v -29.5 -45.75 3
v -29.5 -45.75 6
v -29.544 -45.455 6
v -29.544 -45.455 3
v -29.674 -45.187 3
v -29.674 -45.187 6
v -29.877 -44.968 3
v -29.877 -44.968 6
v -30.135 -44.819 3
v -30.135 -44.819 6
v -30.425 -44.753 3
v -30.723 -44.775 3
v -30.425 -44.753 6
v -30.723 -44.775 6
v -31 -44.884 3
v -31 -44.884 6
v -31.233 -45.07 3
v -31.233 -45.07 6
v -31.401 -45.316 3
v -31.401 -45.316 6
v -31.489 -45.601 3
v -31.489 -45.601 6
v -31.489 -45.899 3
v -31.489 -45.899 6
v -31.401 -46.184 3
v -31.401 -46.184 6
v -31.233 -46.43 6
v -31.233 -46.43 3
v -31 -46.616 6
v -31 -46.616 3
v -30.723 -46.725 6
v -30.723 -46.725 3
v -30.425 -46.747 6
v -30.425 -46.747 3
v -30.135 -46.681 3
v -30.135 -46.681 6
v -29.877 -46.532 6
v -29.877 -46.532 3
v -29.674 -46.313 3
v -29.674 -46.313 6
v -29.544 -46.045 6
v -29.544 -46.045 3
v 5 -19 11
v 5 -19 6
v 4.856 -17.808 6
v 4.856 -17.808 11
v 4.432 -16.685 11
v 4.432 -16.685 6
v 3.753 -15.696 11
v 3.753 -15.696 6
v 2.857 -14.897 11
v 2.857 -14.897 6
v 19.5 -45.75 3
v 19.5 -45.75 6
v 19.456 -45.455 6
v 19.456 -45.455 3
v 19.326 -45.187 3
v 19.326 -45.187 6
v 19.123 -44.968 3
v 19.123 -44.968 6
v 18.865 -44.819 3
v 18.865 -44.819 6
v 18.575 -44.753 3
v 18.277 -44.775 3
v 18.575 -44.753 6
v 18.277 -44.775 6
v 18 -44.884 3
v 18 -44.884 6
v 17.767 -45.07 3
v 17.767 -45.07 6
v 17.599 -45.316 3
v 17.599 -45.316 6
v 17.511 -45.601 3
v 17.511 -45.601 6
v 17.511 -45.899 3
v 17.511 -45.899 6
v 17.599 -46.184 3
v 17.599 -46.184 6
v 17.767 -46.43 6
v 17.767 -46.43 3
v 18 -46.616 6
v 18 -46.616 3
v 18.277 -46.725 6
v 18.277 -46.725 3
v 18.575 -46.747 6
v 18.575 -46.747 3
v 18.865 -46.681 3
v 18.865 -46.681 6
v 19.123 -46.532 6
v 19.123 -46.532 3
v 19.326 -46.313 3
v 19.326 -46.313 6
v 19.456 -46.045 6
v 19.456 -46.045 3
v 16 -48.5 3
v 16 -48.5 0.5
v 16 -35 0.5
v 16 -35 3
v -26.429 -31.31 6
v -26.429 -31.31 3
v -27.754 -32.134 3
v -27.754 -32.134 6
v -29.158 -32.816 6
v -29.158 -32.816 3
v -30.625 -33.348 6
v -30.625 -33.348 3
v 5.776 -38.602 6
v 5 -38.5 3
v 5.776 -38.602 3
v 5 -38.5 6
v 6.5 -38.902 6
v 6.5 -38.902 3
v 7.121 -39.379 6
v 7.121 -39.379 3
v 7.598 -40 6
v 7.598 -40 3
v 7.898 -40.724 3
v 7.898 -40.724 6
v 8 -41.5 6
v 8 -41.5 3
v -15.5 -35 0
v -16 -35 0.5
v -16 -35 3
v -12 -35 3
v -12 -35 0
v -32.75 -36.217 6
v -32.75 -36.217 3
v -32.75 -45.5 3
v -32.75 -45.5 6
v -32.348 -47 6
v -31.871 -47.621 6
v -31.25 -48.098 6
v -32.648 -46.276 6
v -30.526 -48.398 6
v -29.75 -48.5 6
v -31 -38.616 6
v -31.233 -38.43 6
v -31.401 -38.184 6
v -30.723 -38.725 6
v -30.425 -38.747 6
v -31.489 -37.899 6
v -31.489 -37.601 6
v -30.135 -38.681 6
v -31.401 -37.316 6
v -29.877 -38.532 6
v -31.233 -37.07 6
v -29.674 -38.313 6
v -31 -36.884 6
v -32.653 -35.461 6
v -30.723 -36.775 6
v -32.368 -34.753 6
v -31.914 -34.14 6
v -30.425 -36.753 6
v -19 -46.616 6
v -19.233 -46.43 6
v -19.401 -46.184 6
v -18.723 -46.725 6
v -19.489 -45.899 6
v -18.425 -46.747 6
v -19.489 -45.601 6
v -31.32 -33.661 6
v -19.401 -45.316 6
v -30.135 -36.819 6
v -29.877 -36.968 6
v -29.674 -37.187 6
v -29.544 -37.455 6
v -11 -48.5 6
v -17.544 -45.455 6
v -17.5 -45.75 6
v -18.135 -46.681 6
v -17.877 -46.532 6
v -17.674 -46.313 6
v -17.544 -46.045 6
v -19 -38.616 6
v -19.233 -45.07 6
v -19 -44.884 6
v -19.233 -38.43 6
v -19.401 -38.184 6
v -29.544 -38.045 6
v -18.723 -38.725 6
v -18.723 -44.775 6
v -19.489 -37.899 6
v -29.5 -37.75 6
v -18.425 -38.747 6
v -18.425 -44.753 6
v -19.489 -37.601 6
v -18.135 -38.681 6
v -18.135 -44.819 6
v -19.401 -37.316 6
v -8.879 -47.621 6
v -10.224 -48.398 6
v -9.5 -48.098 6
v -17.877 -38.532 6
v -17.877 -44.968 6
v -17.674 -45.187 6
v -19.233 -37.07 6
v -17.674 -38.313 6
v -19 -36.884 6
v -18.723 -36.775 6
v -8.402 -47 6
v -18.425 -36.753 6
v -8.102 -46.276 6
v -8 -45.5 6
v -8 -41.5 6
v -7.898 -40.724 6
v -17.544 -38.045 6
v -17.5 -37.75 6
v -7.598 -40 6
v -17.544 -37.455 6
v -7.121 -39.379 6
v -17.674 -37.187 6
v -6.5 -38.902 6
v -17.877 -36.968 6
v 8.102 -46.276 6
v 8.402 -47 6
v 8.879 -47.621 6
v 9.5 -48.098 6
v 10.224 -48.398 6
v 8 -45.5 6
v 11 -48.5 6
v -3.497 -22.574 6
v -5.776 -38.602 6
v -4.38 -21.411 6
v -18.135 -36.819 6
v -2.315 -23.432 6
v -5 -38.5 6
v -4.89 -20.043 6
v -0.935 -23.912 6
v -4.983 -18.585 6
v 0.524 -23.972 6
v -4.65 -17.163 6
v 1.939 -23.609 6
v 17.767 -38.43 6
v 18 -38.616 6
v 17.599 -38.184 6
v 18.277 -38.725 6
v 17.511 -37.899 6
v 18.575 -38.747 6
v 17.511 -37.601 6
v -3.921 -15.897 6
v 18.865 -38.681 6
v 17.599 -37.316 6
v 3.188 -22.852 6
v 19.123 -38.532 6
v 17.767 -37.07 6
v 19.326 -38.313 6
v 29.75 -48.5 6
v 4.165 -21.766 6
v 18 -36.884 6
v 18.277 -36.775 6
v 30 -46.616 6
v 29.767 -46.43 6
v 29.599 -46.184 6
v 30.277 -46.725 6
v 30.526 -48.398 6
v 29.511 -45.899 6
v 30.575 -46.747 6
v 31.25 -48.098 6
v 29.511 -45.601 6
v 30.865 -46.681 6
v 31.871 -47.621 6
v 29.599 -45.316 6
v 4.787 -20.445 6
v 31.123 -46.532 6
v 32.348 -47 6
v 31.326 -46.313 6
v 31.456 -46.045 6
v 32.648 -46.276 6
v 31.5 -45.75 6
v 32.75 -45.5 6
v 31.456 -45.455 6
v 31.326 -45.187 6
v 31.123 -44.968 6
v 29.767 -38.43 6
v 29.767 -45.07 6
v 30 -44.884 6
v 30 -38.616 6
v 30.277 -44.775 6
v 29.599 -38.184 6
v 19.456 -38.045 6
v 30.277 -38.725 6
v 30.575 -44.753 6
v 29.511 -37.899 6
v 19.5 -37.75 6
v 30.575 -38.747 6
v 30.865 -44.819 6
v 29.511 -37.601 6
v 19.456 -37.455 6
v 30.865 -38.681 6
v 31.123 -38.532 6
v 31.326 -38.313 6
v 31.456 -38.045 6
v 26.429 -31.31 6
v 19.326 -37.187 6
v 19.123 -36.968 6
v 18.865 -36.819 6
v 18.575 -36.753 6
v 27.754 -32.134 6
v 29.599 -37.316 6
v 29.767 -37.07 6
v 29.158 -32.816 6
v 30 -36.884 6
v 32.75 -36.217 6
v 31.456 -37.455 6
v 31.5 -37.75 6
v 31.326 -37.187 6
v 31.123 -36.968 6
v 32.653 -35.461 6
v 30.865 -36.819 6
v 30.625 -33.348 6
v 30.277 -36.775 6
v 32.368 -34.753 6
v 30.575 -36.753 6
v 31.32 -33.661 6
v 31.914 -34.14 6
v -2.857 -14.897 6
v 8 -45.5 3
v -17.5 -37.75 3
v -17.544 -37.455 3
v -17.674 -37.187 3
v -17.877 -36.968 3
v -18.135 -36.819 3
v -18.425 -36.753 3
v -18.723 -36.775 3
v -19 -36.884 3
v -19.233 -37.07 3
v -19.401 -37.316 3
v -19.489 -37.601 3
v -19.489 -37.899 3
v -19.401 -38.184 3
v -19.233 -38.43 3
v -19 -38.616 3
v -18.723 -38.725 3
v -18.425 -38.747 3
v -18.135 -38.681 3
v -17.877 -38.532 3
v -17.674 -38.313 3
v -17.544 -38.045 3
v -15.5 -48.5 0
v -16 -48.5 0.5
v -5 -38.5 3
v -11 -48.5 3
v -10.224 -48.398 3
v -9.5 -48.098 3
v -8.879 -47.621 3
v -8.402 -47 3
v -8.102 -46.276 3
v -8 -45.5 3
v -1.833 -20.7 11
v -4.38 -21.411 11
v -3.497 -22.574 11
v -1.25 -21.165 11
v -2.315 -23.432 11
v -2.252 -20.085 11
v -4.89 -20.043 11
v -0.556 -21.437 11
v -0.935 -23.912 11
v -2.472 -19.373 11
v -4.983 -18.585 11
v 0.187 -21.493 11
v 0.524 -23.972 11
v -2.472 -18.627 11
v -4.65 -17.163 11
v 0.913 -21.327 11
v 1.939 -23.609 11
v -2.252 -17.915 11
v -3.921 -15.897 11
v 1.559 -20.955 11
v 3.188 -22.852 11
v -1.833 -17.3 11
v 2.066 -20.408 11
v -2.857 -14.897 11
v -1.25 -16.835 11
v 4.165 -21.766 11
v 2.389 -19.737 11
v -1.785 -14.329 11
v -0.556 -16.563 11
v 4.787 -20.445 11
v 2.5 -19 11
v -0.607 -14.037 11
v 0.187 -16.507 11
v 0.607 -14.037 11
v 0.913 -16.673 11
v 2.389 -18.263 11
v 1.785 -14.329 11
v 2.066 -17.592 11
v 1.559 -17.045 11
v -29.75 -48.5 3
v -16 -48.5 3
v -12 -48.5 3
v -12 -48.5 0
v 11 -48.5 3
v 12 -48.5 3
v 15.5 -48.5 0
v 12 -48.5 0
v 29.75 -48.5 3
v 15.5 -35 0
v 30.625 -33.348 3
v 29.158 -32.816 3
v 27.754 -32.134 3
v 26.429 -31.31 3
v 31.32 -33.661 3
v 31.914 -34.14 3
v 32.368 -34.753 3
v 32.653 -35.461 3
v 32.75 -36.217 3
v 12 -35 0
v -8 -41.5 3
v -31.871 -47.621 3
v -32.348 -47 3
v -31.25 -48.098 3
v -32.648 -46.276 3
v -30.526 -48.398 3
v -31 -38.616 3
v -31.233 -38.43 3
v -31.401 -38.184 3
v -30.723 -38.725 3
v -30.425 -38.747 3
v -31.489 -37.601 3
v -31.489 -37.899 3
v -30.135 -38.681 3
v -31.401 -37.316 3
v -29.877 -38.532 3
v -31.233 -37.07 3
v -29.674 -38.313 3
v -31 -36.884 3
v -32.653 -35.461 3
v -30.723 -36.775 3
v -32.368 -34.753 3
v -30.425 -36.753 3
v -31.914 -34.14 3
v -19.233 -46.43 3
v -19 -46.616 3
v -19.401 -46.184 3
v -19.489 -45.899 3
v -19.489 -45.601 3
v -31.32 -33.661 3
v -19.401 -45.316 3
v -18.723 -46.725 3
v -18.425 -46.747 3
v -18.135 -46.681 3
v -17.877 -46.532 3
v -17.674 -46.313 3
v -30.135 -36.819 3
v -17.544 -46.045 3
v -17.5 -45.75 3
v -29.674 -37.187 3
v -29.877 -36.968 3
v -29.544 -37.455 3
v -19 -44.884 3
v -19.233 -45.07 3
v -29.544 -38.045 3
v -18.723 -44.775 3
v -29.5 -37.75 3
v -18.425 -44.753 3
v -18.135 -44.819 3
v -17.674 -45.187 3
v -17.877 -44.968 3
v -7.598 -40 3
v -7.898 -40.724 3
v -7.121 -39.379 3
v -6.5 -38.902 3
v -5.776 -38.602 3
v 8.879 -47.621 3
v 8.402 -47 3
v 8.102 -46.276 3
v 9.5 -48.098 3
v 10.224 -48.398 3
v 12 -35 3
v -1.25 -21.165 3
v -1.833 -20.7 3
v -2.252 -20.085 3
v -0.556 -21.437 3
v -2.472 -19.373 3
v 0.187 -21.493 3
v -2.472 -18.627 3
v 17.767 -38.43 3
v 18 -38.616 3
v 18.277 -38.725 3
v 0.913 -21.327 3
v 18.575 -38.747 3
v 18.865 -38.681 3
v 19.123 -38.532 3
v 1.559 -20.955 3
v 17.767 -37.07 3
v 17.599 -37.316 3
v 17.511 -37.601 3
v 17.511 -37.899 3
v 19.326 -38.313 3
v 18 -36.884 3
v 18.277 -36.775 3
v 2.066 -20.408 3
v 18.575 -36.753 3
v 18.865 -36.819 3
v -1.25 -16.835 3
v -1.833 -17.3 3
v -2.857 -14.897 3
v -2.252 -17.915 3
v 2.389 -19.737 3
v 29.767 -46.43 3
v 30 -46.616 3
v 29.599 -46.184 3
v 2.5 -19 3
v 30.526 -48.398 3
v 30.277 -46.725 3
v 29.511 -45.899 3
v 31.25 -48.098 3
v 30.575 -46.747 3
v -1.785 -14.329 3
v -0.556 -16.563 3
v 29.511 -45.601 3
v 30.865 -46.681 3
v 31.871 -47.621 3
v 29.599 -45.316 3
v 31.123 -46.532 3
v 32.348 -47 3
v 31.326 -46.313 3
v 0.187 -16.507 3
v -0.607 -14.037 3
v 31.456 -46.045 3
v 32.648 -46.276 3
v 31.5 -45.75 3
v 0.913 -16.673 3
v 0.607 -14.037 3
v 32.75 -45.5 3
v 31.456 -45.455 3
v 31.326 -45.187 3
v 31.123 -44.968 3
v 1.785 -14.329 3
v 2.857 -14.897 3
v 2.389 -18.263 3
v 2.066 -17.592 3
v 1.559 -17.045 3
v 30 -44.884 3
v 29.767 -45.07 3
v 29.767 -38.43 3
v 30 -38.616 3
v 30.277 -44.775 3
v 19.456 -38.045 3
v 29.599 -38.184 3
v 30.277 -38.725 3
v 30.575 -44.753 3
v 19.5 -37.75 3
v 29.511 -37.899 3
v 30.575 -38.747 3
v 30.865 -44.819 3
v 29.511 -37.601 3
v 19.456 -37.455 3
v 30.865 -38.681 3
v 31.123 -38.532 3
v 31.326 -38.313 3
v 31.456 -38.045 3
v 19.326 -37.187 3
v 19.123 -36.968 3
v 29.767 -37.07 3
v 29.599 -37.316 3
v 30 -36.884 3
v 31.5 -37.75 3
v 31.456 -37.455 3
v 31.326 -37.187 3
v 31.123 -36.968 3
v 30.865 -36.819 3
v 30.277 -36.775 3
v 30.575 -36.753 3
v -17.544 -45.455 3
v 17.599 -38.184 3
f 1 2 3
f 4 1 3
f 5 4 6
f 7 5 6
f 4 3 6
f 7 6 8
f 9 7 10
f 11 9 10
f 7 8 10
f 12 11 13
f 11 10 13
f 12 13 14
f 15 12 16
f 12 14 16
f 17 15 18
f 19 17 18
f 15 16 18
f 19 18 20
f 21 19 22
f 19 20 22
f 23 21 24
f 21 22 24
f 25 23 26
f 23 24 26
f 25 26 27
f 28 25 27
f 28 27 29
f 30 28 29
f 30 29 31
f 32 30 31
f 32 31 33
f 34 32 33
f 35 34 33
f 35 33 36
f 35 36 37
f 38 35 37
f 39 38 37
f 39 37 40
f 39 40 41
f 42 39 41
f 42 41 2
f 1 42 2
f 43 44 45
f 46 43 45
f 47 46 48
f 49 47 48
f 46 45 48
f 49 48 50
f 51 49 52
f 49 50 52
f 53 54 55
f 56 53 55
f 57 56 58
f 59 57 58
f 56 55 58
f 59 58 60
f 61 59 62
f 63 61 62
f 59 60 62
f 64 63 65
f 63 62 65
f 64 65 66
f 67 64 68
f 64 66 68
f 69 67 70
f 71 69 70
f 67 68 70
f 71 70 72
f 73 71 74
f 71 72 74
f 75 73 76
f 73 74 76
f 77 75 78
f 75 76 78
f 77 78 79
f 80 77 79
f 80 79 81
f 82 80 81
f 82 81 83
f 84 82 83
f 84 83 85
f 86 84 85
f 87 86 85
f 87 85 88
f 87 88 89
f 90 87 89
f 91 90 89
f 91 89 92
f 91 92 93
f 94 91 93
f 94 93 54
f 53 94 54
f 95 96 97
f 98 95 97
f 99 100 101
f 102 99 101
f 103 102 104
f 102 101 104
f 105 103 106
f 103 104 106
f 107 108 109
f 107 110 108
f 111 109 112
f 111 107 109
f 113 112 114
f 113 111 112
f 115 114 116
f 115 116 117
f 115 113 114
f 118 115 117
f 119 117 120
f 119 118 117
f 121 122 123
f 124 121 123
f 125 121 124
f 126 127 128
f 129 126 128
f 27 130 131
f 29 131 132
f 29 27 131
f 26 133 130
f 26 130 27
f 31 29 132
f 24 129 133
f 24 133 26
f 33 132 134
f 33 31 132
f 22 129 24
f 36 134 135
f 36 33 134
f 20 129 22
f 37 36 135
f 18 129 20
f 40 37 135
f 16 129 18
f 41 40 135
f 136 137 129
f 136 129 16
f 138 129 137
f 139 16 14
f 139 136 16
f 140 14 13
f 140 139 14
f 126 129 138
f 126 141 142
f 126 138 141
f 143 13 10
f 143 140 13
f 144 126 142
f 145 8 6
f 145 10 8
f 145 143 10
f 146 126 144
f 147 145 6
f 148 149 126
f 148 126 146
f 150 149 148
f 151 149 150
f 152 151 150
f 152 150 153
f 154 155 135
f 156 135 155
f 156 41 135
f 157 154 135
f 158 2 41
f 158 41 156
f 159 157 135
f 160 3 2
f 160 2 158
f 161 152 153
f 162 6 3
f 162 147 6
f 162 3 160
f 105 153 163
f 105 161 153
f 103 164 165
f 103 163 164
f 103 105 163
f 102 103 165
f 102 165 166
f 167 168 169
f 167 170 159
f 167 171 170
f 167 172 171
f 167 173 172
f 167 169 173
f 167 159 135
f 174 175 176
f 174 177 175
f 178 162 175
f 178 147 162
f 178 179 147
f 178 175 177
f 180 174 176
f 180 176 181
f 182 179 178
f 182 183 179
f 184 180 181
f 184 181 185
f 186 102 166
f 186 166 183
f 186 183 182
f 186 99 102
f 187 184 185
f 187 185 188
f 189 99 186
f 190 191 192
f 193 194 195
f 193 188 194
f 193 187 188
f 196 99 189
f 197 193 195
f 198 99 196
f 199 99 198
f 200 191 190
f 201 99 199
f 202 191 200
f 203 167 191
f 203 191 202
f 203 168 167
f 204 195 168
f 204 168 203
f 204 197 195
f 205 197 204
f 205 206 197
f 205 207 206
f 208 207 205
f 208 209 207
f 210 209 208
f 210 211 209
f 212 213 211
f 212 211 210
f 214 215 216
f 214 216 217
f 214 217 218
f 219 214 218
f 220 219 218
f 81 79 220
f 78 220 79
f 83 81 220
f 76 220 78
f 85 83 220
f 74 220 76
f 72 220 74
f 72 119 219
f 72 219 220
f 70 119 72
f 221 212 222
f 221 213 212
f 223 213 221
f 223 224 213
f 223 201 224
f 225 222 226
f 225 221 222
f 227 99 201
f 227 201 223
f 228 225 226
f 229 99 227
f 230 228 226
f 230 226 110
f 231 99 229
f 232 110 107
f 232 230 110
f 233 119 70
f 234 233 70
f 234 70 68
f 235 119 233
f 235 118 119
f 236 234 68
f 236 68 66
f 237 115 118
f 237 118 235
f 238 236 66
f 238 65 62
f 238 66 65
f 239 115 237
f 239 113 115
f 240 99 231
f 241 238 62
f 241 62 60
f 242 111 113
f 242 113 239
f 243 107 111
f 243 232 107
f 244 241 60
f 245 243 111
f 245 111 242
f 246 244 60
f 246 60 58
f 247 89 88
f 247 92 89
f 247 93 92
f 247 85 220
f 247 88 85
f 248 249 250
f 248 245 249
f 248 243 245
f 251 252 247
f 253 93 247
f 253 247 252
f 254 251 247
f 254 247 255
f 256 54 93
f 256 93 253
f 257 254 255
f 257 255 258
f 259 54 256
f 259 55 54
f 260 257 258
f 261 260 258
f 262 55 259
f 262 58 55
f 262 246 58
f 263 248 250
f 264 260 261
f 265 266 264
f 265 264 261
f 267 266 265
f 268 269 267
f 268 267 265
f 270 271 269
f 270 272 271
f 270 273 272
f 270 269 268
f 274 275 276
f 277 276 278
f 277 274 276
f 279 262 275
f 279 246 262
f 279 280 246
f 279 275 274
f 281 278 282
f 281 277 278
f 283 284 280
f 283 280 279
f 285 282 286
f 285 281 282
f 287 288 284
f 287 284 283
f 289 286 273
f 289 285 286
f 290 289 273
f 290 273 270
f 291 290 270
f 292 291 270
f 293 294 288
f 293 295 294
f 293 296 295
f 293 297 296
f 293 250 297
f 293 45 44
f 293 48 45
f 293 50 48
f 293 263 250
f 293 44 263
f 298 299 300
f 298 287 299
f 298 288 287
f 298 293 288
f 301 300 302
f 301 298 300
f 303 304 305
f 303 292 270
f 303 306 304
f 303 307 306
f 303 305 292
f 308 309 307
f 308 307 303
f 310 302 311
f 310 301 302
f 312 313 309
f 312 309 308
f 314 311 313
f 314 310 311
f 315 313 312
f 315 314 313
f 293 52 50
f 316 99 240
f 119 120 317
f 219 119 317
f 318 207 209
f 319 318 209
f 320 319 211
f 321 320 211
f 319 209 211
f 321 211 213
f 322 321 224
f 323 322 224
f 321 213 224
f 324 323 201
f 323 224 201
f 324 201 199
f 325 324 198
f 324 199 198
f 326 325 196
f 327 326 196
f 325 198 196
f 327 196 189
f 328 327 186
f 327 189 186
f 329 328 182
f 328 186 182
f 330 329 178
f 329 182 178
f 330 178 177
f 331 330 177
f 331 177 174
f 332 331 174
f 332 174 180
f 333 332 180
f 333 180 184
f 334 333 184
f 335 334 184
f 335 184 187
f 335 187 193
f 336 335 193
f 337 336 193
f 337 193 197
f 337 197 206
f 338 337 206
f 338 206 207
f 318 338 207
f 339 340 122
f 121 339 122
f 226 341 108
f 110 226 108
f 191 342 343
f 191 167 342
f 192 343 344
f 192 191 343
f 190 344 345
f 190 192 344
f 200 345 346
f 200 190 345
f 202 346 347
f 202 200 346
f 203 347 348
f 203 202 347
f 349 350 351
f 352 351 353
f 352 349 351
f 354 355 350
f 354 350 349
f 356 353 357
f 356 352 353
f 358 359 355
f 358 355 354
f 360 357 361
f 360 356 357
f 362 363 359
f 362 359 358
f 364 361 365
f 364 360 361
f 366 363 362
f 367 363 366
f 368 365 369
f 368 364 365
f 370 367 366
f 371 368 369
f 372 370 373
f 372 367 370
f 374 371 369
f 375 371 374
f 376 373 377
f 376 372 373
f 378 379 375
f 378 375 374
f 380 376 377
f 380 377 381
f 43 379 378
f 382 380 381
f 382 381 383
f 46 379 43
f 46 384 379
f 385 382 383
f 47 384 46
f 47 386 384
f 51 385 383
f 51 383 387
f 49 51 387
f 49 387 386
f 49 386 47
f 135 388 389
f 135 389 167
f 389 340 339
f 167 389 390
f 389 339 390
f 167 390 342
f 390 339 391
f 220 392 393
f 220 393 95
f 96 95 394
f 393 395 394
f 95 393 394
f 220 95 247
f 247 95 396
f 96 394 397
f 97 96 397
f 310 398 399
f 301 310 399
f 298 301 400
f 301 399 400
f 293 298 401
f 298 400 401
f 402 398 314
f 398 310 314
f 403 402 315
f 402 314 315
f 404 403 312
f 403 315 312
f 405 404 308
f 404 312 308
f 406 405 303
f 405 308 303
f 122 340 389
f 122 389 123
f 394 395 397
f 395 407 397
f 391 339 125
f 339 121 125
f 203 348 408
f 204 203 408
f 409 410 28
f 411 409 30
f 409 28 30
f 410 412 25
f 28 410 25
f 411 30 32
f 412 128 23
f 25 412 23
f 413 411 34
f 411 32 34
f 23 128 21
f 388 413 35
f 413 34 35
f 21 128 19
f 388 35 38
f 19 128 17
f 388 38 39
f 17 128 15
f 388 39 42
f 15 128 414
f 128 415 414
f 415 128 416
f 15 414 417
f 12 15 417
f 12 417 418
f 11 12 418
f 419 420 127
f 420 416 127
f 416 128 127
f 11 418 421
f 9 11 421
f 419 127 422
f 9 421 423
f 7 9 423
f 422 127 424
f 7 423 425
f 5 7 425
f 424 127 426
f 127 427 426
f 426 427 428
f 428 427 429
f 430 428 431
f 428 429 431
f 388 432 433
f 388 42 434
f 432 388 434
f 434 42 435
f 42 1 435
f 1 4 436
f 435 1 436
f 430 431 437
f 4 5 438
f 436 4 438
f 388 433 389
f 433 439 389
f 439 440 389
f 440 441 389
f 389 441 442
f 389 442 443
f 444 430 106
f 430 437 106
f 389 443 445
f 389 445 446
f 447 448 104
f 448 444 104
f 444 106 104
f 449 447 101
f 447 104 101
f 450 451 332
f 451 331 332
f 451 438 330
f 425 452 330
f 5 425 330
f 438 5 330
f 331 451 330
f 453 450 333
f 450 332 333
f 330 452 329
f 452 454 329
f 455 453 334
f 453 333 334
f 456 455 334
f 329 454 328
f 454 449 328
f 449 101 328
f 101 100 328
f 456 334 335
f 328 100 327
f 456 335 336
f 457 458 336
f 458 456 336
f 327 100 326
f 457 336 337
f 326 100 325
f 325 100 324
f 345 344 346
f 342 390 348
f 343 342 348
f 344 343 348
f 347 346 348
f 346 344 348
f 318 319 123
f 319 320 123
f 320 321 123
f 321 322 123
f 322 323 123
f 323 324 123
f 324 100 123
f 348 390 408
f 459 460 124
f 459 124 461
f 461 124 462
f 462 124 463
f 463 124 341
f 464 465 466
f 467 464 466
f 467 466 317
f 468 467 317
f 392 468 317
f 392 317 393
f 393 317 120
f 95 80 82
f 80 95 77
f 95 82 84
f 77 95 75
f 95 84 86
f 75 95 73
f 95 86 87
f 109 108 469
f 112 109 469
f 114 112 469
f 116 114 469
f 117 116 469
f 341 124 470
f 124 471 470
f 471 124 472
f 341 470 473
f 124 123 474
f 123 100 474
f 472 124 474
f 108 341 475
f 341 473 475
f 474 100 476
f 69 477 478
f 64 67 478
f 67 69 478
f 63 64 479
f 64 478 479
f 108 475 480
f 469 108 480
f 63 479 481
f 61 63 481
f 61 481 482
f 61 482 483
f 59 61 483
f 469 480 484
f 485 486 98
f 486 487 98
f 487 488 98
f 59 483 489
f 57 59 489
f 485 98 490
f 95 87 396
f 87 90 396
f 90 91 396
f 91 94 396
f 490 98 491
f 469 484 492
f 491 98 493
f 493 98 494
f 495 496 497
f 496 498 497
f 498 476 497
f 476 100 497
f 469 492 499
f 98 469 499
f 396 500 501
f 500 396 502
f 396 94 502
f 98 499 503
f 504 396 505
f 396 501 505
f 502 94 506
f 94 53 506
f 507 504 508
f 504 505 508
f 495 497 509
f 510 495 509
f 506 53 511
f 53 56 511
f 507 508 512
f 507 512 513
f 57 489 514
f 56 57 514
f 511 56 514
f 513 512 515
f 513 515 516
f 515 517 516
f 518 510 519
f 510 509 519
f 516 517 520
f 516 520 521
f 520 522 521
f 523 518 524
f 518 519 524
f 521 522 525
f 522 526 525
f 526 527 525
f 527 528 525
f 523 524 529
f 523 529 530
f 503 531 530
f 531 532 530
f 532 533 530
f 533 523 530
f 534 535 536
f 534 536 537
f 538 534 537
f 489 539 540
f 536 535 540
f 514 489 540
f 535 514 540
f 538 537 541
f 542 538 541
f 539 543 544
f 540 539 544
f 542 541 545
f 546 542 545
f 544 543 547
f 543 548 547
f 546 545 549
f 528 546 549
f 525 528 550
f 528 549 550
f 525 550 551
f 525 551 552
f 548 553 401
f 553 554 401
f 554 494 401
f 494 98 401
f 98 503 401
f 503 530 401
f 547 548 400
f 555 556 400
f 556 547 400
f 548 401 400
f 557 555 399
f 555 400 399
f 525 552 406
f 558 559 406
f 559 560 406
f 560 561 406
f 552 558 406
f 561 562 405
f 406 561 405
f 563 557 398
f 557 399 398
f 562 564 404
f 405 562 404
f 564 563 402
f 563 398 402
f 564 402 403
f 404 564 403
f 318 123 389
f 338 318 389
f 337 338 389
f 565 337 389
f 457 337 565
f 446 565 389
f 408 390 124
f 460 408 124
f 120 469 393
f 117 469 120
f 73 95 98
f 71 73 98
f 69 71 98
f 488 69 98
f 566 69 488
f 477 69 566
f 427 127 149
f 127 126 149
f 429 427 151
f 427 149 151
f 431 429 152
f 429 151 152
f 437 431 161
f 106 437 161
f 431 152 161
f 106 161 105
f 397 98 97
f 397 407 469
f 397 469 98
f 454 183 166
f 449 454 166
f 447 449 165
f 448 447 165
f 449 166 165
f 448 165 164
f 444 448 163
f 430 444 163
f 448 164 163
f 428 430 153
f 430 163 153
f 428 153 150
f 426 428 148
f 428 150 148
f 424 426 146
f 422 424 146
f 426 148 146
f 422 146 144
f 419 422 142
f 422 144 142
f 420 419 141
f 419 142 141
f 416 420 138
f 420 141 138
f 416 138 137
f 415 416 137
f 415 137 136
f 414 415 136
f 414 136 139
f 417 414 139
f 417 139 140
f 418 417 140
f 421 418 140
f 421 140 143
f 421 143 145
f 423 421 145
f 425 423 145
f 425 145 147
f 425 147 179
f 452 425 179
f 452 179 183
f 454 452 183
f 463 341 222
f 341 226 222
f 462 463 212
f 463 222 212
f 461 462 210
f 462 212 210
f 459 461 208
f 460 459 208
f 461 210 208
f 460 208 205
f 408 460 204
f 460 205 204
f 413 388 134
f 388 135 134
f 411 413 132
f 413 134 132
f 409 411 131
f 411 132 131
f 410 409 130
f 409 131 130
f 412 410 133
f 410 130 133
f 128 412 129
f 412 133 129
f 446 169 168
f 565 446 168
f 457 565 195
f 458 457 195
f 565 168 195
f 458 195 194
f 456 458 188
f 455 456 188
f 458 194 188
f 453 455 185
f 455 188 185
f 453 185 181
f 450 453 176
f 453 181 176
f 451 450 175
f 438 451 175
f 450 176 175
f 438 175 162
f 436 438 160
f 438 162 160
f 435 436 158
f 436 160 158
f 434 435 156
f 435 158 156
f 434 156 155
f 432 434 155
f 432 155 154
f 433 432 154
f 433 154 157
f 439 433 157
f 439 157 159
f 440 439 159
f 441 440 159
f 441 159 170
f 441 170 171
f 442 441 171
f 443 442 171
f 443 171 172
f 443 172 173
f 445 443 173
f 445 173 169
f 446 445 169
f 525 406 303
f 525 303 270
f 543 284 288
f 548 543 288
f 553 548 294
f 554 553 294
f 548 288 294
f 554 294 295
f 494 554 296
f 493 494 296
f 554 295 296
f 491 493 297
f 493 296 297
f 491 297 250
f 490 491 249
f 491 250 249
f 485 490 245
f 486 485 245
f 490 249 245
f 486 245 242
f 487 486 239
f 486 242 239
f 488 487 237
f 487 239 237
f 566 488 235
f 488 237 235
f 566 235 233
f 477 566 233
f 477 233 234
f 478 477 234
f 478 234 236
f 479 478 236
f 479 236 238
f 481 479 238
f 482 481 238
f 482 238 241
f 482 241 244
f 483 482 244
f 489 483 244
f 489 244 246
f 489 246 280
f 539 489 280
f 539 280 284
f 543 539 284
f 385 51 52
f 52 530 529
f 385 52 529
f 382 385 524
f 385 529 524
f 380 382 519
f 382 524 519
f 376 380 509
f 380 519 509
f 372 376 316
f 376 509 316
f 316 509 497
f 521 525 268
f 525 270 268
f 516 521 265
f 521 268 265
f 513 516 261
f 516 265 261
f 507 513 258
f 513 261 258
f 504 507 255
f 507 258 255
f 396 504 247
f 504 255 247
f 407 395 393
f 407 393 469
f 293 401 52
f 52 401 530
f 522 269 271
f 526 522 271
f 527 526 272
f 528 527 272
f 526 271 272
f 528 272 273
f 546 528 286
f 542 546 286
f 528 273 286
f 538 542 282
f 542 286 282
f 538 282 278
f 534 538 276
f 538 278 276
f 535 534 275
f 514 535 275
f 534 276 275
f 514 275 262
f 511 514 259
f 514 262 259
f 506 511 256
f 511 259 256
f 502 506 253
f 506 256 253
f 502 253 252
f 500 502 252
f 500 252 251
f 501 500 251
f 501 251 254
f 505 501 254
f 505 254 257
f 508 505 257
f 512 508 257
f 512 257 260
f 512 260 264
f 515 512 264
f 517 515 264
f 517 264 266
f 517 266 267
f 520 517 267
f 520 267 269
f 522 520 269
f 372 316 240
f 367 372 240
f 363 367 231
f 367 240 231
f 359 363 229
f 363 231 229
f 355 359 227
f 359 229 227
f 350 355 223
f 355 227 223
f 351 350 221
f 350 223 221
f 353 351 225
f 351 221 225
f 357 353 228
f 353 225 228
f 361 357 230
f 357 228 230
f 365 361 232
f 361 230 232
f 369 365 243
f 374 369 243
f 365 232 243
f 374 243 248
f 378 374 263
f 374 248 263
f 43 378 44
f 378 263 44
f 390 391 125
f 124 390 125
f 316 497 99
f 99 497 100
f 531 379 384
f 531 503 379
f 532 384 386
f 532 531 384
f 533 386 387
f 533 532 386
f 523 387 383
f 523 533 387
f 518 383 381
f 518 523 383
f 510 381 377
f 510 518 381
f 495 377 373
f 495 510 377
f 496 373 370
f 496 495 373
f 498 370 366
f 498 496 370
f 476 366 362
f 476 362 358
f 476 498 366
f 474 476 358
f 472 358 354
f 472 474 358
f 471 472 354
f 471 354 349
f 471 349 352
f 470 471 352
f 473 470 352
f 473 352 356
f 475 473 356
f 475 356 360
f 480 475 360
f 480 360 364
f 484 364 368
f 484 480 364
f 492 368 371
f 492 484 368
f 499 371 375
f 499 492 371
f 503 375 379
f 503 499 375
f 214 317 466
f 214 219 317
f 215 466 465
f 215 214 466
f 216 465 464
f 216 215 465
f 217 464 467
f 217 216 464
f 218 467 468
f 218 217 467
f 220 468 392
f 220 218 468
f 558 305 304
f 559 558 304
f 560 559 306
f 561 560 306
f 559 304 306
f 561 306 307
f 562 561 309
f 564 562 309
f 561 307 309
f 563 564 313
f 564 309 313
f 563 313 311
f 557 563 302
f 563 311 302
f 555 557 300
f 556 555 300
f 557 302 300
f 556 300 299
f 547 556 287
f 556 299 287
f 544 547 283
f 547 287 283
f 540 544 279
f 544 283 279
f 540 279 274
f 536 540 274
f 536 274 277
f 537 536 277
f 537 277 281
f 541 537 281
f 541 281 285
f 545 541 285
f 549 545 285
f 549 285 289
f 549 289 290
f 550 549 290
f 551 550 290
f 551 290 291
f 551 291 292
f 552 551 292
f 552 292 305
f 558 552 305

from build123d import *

# Parameters (mm, degrees)
SKETCH_1_W          = 4
SKETCH_1_H          = 13.5
EXTRUDE_1_DEPTH     = 3
EXTRUDE_1_2_DEPTH   = 3
EXTRUDE_1_3_DEPTH   = 3
EXTRUDE_1_4_DEPTH   = 3
SKETCH_2_R          = 2.5
EXTRUDE_2_DEPTH     = 3
FILLET_3_R          = 3
FILLET_4_R          = 5
CHAMFER_1_SIZE      = 0.5
SKETCH_5_R          = 1
CUT_EXTRUDE_3_DEPTH = 4
CUT_EXTRUDE_START   = -14
CUT_EXTRUDE_4_DEPTH = 14
FILLET_6_R          = 3
SKETCH_10_R         = 2.5
EXTRUDE_5_DEPTH     = 5


with BuildPart() as part:
    # 草图1 → 凸台-拉伸1 (new body)
    with BuildSketch(Plane.XY):
        with Locations((-35, -41.75)):
            Rectangle(SKETCH_1_W, SKETCH_1_H)
    extrude(amount=EXTRUDE_1_DEPTH)



with BuildPart() as body_2:
    # 草图1 → Extrude 1 2 (new body)
    with BuildSketch(Plane.XY):
        with Locations((-14, -41.75)):
            Rectangle(SKETCH_1_W, SKETCH_1_H)
    extrude(amount=EXTRUDE_1_2_DEPTH)


with BuildPart() as body_3:
    # 草图1 → Extrude 1 3 (new body)
    with BuildSketch(Plane.XY):
        with Locations((14, -41.75)):
            Rectangle(SKETCH_1_W, SKETCH_1_H)
    extrude(amount=EXTRUDE_1_3_DEPTH)


with BuildPart() as body_4:
    # 草图1 → Extrude 1 4 (new body)
    with BuildSketch(Plane.XY):
        with Locations((35, -41.75)):
            Rectangle(SKETCH_1_W, SKETCH_1_H)
    extrude(amount=EXTRUDE_1_4_DEPTH)


with BuildPart() as part_1:
    add(part.part)

    add(body_2.part)  # 凸台-拉伸2 merges body 2

    add(body_3.part)  # 凸台-拉伸2 merges body 3

    add(body_4.part)  # 凸台-拉伸2 merges body 4
    # 草图2 → 凸台-拉伸2 (add)
    with BuildSketch(Plane.XY.offset(3)):
        with BuildLine():
            Line((-37, -35), (-37, -48.5))
            Line((-37, -48.5), (-12, -48.5))
            Line((-12, -48.5), (-8, -48.5))
            Line((-8, -48.5), (-8, -38.5))
            Line((-8, -38.5), (8, -38.5))
            Line((8, -38.5), (8, -48.5))
            Line((8, -48.5), (12, -48.5))
            Line((12, -48.5), (37, -48.5))
            Line((37, -48.5), (37, -35))
            Line((37, -35), (37, -34))
            Line((37, -34), (35, -34))
            ThreePointArc((35, -34), (30.508154972, -33.311650088), (26.428571429, -31.3097771))
            Line((26.428571429, -31.3097771), (2.857142857, -14.896740967))
            ThreePointArc((2.857142857, -14.896740967), (0, -14), (-2.857142857, -14.896740967))
            Line((-2.857142857, -14.896740967), (-26.428571429, -31.3097771))
            ThreePointArc((-26.428571429, -31.3097771), (-30.508154972, -33.311650088), (-35, -34))
            Line((-35, -34), (-37, -34))
            Line((-37, -34), (-37, -35))
        make_face()
        with Locations((0, -19)):
            Circle(SKETCH_2_R, mode=Mode.SUBTRACT)
    extrude(amount=EXTRUDE_2_DEPTH)

    # 圆角3
    fillet_3_edges = [part_1.edges().sort_by_distance(p)[0] for p in [
        (-8, -48.5, 4.5),
        (-8, -38.5, 4.5),
        (8, -38.5, 4.5),
        (8, -48.5, 4.5),
        (37, -48.5, 3),
        (-37, -48.5, 3),
    ]]
    fillet(fillet_3_edges, radius=FILLET_3_R)

    # 圆角4
    # the kernel refuses this fillet: 5 mm, written as the material it takes off along each edge
    with BuildSketch(Plane(origin=(37, -34, -8.934299833), x_dir=(0, -1, 0), z_dir=(0, 0, 1))) as fillet_4_piece_1:
        with BuildLine():
            CenterArc((4.773719933, -5), FILLET_4_R, 90, 81.373073441)
            Line((-0.16971005, -4.25), (-0.664053048, -4.175))
            ThreePointArc((-0.664053048, -4.175), (-0.5, -2), (-0.5, 0))
            Line((-0.5, 0), (0, 0.5))
            Line((0, 0.5), (4.773719933, 0.5))
            Line((4.773719933, 0.5), (4.773719933, 0))
        make_face()
    extrude(amount=26.868599666, mode=Mode.SUBTRACT)
    with BuildSketch(Plane(origin=(-37, -34, -8.934299833), x_dir=(0.9992036788156995, 0.039899977959549054, 0), z_dir=(0, 0, 1))) as fillet_4_piece_2:
        with BuildLine():
            CenterArc((4.805547074, -4.969418409), FILLET_4_R, 96.340219202, 81.373073441)
            Line((-0.19047132, -4.769918519), (-0.69007316, -4.74996853))
            Line((-0.69007316, -4.74996853), (-0.499601839, 0.019949989))
            Line((-0.499601839, 0.019949989), (0.019949989, 0.499601839))
            ThreePointArc((0.019949989, 0.499601839), (2.018357347, 0.419801883), (4.198171061, 0.496941841))
            Line((4.198171061, 0.496941841), (4.253387062, 0))
        make_face()
    extrude(amount=26.868599666, mode=Mode.SUBTRACT)

    # 倒角1
    chamfer_1_edges = [part_1.edges().sort_by_distance(p)[0] for p in [
        (-16, -41.75, 0),
        (-33, -41.75, 0),
        (16, -41.75, 0),
        (33, -41.75, 0),
    ]]
    chamfer(chamfer_1_edges, length=CHAMFER_1_SIZE)

    # 草图5 → 切除-拉伸3 (cut)
    with BuildSketch(Plane.XY.offset(6)):
        with Locations((-18.5, -45.75)):
            Circle(SKETCH_5_R)
        with Locations((-18.5, -37.75)):
            Circle(SKETCH_5_R)
        with Locations((-30.5, -45.75)):
            Circle(SKETCH_5_R)
        with Locations((-30.5, -37.75)):
            Circle(SKETCH_5_R)
        with Locations((18.5, -45.75)):
            Circle(SKETCH_5_R)
        with Locations((18.5, -37.75)):
            Circle(SKETCH_5_R)
        with Locations((30.5, -45.75)):
            Circle(SKETCH_5_R)
        with Locations((30.5, -37.75)):
            Circle(SKETCH_5_R)
    extrude(amount=-CUT_EXTRUDE_3_DEPTH, mode=Mode.SUBTRACT)

    # 草图9 → 切除-拉伸4 (cut)
    with BuildSketch(Plane.XY.offset(6).offset(CUT_EXTRUDE_START)):
        with BuildLine():
            Line((37, -45.5), (37, -38.773719933))
            ThreePointArc((37, -38.773719933), (35.791437722, -35.514118731), (32.75, -33.83028995))
            Line((32.75, -33.83028995), (32.75, -48.5))
            Line((32.75, -48.5), (34, -48.5))
            ThreePointArc((34, -48.5), (36.121320344, -47.621320344), (37, -45.5))
        make_face()
        with BuildLine():
            Line((-32.75, -33.83028995), (-32.75, -48.5))
            Line((-32.75, -48.5), (-34, -48.5))
            ThreePointArc((-34, -48.5), (-36.121320344, -47.621320344), (-37, -45.5))
            Line((-37, -45.5), (-37, -38.773719933))
            ThreePointArc((-37, -38.773719933), (-35.791437722, -35.514118731), (-32.75, -33.83028995))
        make_face()
    extrude(amount=CUT_EXTRUDE_4_DEPTH, mode=Mode.SUBTRACT)

    # 圆角6
    fillet_6_edges = [part_1.edges().sort_by_distance(p)[0] for p in [
        (32.75, -33.83028995, 4.5),
        (-32.75, -33.83028995, 4.5),
        (32.75, -48.5, 4.5),
        (-32.75, -48.5, 4.5),
    ]]
    fillet(fillet_6_edges, radius=FILLET_6_R)

    # 草图10 → 凸台-拉伸5 (add)
    with BuildSketch(Plane.XY.offset(6)):
        with BuildLine():
            ThreePointArc((5, -19), (4.432026302, -16.685449751), (2.857142857, -14.896740967))
            ThreePointArc((2.857142857, -14.896740967), (0, -14), (-2.857142857, -14.896740967))
            ThreePointArc((-2.857142857, -14.896740967), (-2.314550249, -23.432026302), (5, -19))
        make_face()
        with Locations((0, -19)):
            Circle(SKETCH_10_R, mode=Mode.SUBTRACT)
    extrude(amount=EXTRUDE_5_DEPTH)


solid = part_1.part
